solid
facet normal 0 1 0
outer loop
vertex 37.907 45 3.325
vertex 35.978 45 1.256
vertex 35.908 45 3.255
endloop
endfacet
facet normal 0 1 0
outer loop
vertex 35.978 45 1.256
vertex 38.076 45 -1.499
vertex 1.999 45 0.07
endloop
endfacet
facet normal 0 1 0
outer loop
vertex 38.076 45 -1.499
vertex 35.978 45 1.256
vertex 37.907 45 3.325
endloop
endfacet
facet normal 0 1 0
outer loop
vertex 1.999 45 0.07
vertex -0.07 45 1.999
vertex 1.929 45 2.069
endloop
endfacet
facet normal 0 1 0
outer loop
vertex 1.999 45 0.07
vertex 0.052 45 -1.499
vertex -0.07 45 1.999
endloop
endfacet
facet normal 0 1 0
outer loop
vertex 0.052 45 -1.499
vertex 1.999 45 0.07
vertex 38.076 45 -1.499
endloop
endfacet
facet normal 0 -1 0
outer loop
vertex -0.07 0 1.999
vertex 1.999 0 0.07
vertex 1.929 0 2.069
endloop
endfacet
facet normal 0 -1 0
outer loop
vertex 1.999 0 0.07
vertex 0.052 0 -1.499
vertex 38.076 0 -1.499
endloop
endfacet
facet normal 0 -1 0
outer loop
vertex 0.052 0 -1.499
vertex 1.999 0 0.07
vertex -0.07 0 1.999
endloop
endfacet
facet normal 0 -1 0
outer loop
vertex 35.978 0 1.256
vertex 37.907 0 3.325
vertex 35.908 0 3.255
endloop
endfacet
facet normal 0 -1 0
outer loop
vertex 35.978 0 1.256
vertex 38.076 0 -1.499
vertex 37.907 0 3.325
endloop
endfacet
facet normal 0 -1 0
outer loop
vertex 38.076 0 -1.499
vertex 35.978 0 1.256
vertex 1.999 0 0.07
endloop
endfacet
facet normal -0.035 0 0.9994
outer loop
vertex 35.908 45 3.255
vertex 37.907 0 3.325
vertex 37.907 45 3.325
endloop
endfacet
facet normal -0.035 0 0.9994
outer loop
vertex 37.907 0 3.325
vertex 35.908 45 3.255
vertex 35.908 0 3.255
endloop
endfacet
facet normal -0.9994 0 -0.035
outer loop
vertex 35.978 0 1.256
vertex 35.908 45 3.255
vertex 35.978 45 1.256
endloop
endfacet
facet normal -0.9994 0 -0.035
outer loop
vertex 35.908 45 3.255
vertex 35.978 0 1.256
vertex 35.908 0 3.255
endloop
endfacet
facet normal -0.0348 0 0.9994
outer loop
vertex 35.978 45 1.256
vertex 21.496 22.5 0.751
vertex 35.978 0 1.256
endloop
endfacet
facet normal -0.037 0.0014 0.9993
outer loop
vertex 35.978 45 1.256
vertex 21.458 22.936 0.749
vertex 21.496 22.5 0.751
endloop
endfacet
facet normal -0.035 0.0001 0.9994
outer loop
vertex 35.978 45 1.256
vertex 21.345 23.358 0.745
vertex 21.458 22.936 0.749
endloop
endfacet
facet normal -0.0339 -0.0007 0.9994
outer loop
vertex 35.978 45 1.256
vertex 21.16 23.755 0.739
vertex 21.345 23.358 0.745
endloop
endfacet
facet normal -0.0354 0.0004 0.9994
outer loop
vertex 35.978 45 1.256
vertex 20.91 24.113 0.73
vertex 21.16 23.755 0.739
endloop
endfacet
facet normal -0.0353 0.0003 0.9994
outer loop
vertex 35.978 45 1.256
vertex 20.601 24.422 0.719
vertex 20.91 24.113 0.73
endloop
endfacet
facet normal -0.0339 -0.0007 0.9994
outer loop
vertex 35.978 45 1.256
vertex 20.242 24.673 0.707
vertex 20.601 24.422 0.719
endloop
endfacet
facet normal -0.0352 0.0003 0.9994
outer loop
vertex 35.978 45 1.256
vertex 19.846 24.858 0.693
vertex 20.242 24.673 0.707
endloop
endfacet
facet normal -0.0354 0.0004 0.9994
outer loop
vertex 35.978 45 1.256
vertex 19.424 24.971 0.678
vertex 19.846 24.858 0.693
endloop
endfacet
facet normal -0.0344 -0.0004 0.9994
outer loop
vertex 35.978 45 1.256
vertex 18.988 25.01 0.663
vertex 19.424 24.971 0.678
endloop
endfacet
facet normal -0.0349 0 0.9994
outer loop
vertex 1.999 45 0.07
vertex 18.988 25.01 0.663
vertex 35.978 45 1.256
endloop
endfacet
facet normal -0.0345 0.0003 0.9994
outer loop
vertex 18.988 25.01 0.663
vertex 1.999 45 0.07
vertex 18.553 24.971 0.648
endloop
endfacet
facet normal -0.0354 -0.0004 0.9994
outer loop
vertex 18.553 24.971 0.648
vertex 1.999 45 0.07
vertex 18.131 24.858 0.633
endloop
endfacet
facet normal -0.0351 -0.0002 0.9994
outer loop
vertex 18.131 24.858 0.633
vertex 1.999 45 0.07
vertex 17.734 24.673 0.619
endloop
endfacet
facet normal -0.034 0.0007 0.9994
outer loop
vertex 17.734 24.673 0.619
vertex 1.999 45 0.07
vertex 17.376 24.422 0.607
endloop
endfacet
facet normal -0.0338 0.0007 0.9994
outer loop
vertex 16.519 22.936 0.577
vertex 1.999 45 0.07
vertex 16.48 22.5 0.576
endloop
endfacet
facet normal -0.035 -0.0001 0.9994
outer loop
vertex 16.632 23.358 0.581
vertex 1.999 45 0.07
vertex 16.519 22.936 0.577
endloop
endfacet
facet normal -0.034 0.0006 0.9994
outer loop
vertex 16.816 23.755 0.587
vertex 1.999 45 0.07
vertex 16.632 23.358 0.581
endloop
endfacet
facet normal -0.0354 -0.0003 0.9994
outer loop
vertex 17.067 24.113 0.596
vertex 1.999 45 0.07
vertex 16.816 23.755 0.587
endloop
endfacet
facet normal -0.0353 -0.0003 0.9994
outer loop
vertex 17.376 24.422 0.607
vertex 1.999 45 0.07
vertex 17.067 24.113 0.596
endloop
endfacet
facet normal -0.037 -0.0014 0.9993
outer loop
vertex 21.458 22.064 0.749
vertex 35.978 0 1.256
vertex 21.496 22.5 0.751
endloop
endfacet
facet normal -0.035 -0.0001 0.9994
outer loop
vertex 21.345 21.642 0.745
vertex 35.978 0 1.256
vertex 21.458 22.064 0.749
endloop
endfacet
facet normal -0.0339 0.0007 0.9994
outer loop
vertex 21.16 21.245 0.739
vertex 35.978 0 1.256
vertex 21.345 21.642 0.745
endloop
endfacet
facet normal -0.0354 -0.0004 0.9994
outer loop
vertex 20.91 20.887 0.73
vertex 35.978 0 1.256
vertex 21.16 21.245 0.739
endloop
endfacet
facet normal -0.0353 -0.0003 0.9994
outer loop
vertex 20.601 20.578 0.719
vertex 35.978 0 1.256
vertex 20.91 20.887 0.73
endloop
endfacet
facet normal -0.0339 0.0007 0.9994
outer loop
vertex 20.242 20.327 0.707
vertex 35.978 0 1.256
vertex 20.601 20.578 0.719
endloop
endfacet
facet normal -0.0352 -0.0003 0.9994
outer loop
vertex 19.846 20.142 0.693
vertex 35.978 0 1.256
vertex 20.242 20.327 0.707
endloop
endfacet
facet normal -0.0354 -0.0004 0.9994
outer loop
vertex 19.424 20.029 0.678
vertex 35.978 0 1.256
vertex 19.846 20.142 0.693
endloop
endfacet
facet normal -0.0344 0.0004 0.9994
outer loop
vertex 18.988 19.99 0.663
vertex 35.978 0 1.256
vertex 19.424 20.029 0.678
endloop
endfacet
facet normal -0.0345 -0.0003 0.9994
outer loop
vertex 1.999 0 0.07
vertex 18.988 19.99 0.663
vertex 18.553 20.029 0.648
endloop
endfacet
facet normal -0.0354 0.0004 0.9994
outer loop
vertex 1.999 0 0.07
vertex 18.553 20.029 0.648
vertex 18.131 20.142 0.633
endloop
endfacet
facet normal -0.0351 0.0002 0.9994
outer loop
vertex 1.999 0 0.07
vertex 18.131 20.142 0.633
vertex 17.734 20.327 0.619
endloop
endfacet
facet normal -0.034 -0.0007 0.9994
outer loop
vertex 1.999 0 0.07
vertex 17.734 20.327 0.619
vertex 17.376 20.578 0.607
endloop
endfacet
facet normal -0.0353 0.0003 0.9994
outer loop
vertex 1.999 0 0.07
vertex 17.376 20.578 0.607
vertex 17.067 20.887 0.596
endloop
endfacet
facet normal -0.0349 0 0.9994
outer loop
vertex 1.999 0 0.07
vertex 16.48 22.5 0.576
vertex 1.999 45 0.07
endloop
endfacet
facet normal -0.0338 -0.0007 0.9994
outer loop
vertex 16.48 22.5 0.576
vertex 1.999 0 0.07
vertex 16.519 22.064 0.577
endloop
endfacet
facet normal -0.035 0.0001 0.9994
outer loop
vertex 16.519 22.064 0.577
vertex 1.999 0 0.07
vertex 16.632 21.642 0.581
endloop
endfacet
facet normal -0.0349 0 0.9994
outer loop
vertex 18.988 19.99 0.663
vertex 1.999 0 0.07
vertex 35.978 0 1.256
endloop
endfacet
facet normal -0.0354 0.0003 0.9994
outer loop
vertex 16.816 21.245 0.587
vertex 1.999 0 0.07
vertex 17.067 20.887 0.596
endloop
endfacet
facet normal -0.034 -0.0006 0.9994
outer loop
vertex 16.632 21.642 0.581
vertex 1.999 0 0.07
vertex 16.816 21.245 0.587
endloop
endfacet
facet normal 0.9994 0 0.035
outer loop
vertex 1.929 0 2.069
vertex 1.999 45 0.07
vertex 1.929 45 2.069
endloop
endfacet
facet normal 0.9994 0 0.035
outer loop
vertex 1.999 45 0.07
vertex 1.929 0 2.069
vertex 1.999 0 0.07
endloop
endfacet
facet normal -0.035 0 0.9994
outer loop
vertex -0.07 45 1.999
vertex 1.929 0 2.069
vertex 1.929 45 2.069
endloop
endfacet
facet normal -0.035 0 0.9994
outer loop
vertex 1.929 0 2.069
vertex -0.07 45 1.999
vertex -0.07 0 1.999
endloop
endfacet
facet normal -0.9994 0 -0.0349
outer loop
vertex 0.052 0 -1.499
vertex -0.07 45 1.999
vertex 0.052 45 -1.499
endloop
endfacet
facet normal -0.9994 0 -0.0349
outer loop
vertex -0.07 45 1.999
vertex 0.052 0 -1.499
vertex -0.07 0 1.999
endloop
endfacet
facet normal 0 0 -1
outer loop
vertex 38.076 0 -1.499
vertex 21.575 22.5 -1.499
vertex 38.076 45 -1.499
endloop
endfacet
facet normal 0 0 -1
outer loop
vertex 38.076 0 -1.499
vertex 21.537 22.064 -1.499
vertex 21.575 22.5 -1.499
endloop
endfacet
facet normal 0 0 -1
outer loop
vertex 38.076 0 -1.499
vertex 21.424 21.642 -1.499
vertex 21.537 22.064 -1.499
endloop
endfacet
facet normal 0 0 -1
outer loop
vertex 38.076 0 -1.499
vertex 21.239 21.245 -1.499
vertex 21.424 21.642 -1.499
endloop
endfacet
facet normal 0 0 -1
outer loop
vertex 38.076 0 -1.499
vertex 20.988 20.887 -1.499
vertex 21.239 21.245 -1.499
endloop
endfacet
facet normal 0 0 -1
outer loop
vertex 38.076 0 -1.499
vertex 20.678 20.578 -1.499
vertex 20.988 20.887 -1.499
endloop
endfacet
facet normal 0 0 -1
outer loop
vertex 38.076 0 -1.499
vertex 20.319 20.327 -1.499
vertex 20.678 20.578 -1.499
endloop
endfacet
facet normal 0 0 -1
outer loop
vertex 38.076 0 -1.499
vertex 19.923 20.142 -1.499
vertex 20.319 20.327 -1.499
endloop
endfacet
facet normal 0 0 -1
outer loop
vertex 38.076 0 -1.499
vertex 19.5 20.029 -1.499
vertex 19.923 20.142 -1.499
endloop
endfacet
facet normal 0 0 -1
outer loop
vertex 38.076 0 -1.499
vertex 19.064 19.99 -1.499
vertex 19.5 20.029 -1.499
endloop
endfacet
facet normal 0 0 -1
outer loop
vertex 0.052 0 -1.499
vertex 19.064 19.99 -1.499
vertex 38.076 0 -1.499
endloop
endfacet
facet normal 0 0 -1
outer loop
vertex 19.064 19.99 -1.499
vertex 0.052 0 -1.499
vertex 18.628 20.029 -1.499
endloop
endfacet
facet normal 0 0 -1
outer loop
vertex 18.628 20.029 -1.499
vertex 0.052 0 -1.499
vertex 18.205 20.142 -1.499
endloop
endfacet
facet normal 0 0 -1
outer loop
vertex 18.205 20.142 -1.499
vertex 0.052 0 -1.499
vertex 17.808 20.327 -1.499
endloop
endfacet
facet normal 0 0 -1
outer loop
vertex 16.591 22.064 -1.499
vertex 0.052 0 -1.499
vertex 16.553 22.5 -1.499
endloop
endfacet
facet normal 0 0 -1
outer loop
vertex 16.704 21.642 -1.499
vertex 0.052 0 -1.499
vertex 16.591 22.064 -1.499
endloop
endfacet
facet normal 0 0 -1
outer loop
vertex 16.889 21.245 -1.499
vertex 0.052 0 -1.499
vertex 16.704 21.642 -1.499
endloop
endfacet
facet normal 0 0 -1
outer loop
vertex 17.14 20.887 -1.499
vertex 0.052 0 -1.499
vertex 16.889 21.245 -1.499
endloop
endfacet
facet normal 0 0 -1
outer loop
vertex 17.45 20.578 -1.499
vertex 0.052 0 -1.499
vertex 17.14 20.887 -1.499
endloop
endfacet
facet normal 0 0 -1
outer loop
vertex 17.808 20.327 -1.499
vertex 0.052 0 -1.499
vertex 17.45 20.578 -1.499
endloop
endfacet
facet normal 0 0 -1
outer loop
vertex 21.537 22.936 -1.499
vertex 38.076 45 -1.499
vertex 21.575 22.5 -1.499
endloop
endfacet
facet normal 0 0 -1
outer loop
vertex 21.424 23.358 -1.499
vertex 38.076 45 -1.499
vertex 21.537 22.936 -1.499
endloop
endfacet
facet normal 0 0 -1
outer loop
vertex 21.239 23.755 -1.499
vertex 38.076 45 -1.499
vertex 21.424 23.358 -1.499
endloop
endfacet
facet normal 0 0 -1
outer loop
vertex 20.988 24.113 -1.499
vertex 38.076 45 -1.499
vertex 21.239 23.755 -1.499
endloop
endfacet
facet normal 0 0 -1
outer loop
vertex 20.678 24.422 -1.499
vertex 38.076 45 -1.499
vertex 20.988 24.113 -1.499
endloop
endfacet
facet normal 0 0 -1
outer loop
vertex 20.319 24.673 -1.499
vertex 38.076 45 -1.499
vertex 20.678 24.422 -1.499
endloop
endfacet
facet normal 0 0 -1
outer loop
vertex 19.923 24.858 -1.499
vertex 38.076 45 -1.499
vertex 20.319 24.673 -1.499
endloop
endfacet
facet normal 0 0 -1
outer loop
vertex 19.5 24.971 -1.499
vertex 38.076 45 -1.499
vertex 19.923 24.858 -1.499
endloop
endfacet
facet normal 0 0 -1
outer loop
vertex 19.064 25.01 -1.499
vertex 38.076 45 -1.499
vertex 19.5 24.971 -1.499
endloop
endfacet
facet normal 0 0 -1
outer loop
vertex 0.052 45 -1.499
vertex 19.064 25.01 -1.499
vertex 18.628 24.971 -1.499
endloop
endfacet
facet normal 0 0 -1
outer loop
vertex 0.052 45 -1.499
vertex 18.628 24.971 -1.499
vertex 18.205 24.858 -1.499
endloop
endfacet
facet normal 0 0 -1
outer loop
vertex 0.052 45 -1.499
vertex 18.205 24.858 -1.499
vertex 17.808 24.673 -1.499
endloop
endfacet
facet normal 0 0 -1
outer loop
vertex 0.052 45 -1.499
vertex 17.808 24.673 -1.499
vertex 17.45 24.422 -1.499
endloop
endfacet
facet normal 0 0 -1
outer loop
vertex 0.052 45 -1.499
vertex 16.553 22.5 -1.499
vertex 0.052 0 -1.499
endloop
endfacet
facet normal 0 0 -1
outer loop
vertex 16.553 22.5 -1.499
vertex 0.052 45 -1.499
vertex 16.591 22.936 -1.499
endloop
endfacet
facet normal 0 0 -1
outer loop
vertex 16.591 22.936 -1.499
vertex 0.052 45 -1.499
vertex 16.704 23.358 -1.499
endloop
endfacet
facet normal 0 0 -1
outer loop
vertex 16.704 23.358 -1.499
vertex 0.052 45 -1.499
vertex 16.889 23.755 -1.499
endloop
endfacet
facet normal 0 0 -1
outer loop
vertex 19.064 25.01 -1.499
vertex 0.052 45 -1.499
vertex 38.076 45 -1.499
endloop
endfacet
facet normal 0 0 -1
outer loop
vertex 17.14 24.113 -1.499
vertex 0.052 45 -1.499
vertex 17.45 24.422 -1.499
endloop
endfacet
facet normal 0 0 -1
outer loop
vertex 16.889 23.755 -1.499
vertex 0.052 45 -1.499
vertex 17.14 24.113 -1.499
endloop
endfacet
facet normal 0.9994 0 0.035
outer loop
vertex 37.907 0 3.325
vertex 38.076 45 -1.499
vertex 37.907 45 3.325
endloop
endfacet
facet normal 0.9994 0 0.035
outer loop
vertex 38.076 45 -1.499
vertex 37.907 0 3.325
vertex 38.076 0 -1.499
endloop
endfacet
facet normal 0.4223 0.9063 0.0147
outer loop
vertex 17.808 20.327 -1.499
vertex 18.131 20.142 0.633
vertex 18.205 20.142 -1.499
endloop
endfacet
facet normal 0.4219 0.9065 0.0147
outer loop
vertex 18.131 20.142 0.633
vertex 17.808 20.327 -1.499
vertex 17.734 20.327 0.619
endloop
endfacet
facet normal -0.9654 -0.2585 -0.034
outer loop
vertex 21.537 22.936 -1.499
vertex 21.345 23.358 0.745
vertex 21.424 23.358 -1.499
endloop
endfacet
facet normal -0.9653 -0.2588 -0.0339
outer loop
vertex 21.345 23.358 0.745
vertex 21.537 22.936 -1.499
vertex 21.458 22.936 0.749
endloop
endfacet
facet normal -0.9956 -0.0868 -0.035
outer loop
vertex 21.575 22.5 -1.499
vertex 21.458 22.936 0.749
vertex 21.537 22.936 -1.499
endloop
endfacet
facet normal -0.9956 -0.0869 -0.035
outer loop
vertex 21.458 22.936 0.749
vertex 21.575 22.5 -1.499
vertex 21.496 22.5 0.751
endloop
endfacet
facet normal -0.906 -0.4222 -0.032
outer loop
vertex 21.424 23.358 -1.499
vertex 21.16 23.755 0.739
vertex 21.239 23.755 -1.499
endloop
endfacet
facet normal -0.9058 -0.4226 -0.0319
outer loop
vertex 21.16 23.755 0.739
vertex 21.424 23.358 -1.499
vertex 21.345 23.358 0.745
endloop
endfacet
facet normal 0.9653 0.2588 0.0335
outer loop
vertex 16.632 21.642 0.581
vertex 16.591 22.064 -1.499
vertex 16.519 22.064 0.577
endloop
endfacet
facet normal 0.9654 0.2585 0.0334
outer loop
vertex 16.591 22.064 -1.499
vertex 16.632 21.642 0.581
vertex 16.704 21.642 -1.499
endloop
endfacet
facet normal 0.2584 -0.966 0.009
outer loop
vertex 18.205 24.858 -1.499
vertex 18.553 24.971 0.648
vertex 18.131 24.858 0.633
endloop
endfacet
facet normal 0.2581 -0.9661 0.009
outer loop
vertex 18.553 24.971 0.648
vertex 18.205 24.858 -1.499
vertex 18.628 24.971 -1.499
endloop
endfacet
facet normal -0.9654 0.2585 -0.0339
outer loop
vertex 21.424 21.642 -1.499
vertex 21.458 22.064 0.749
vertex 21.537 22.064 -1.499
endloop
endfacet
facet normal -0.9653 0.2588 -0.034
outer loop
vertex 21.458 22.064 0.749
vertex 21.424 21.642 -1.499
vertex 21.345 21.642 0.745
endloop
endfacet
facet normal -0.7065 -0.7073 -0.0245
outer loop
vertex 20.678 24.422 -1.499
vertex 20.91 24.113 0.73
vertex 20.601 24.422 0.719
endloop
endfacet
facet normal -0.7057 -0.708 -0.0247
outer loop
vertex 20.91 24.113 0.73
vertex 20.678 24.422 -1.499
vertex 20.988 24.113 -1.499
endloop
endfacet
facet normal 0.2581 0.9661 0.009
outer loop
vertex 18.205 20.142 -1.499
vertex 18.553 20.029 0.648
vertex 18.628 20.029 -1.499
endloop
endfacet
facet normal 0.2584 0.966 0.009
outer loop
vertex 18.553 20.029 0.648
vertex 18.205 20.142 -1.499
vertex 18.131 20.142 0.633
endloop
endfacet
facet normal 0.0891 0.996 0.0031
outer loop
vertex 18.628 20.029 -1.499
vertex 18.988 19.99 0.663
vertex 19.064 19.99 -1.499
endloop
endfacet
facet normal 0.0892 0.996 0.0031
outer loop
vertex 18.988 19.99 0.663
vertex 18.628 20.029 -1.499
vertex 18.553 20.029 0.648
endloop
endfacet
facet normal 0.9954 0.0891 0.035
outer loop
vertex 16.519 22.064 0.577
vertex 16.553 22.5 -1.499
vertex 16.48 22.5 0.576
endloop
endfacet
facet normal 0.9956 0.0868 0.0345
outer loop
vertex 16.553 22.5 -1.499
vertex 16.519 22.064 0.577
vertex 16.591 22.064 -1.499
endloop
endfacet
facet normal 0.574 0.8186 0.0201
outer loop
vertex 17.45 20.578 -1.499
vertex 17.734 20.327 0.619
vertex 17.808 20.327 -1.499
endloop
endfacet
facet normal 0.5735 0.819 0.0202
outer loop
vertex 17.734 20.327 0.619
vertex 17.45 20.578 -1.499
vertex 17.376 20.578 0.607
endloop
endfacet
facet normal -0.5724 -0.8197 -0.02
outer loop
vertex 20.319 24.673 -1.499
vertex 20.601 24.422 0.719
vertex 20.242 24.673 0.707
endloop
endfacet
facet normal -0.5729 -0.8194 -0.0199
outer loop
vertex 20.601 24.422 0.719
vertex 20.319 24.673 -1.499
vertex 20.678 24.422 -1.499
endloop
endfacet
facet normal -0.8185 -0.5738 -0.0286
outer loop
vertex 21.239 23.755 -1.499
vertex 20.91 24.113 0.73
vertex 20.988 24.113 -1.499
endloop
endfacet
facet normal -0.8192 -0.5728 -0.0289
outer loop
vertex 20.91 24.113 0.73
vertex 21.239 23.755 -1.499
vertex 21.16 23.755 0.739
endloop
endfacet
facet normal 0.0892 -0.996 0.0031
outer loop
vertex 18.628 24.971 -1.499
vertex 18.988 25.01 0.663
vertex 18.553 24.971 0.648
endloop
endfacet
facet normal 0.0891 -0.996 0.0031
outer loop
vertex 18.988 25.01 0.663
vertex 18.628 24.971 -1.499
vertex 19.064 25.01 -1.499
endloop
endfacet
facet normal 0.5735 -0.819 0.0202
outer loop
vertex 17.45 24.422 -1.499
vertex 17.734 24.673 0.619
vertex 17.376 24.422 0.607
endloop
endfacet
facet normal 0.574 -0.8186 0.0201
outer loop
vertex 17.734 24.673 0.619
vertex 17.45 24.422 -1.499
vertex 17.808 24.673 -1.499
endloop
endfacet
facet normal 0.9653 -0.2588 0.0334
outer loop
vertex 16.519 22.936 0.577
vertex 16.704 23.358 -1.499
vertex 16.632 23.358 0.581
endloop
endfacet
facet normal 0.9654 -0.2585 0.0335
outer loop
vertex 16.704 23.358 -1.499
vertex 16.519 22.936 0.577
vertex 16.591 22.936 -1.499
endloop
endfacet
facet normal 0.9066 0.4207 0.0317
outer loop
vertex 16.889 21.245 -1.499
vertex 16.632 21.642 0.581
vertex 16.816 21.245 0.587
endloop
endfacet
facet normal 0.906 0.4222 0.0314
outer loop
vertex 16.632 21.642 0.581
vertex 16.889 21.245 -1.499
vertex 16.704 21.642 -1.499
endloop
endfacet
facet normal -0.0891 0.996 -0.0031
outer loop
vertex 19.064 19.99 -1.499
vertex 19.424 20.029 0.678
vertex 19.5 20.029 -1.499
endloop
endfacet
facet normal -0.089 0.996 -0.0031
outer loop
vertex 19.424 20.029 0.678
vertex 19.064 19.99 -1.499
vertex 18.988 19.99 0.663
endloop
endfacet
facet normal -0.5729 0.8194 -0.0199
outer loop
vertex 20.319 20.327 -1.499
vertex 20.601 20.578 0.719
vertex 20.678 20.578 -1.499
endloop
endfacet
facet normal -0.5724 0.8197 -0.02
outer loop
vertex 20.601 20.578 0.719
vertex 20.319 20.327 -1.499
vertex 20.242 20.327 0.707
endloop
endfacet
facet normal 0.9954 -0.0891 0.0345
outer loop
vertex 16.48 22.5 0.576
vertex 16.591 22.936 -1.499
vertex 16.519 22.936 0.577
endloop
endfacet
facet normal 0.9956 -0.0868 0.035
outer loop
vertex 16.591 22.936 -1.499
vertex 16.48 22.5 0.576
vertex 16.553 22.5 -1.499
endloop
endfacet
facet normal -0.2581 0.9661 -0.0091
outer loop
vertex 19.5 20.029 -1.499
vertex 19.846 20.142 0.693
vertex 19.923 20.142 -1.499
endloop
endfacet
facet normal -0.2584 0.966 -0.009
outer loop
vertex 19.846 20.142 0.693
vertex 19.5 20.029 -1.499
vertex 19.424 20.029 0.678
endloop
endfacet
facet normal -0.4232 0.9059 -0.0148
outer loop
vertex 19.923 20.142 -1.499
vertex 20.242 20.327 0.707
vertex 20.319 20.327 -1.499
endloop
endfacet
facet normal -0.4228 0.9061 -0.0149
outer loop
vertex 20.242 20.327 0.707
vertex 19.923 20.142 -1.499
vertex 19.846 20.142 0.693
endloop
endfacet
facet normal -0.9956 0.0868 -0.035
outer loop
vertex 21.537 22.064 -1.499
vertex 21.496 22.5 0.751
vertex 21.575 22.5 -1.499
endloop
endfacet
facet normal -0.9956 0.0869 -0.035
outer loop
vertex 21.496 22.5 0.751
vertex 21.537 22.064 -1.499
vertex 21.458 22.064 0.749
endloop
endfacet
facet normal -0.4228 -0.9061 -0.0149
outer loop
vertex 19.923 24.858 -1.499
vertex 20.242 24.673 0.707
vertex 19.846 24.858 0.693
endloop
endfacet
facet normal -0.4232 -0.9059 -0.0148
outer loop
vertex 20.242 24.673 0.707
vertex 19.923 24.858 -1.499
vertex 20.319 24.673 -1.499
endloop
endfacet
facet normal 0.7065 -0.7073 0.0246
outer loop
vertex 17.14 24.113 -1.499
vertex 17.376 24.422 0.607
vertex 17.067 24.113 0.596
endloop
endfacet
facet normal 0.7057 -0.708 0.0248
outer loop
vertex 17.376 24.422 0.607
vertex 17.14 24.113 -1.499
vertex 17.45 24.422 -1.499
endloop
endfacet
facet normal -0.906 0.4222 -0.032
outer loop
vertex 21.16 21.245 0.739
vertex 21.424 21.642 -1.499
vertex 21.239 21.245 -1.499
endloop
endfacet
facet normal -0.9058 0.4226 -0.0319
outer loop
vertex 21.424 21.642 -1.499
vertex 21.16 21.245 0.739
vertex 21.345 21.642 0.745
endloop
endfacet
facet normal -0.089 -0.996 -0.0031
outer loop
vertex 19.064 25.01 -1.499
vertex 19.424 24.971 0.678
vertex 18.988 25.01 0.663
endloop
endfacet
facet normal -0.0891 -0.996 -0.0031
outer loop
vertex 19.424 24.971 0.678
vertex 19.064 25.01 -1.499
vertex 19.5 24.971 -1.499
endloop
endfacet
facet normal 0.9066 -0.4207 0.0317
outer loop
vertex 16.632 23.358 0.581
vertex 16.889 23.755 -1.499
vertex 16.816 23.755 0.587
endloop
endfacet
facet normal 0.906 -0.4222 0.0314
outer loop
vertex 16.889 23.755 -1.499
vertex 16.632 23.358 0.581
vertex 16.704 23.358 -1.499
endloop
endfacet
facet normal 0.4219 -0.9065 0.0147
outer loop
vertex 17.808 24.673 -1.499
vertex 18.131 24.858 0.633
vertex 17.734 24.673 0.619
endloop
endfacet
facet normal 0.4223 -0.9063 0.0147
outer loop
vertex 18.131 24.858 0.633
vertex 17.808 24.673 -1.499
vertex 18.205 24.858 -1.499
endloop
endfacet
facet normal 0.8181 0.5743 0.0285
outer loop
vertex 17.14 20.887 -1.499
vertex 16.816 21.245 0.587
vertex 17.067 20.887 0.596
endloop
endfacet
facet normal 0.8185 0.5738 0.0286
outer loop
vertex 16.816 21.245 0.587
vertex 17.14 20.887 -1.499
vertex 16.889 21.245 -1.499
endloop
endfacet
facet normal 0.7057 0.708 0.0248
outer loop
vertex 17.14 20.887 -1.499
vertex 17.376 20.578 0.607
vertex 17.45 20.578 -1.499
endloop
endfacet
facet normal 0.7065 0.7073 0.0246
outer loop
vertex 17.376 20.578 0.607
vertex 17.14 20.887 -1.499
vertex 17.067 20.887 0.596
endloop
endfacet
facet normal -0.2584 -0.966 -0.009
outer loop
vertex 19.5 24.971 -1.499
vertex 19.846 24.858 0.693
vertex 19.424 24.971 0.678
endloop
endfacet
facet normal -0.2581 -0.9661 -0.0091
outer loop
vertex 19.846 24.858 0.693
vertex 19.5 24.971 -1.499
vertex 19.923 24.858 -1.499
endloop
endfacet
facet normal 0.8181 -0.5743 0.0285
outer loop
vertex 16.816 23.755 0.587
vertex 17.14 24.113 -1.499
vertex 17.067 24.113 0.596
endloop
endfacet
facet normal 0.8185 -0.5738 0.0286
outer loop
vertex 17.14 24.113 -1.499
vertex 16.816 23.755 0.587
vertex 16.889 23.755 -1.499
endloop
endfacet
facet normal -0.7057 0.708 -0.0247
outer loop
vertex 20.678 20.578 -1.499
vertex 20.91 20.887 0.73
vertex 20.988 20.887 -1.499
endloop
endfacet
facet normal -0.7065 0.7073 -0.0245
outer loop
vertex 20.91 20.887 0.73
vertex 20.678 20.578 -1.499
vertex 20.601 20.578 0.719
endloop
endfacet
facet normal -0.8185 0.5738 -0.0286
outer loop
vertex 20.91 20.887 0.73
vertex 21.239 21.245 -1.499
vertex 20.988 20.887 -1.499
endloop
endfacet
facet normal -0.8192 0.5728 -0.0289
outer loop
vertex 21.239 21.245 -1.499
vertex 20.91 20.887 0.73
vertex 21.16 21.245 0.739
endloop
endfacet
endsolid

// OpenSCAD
rail_width = 34;
shim_length = 45;
screw_diameter = 5;
rake_angle = 2; // Ceiling or rafter angle in degrees
seat_height = 2; // How tall should seating ridges be in mm
seat_width = 2; // How wide should seating ridges be on either side of shim
min_shim_depth = 1.5; // Minimum depth of the shim, not including seat part
rotate_shim = true;

/* [ Hidden ] */
$fn = 36;
screw_radius = screw_diameter / 2;
shim_width = rail_width + (2 * seat_width);

// from wiki  https://en.wikibooks.org/wiki/OpenSCAD_User_Manual/undersized_circular_objects
module cylinder_outer(height,radius){
   fudge = 1/cos(180/$fn);
   cylinder(h=height,r=radius*fudge);}

// tan(x) * A = O
opposite_length = tan(rake_angle) * shim_width;

// draw out the shim, then extrude
points = [
    [0, -min_shim_depth],
    [shim_width, -min_shim_depth - opposite_length],
    [shim_width, seat_height],
    [shim_width - seat_width, seat_height],
    [shim_width - seat_width, 0],
    [seat_width, 0],
    [seat_width, seat_height],
    [0, seat_height]
];

rotate([
   0,
      rotate_shim ? -rake_angle : 0,
   0
   ]) difference() {
    translate([0, shim_length, 0]) rotate([90, 0, 0]) linear_extrude(shim_length) polygon(points);

    // make a hole for the screw
    translate([shim_width / 2, shim_length /2, -opposite_length -min_shim_depth]) cylinder_outer(opposite_length + min_shim_depth, screw_radius);
}
